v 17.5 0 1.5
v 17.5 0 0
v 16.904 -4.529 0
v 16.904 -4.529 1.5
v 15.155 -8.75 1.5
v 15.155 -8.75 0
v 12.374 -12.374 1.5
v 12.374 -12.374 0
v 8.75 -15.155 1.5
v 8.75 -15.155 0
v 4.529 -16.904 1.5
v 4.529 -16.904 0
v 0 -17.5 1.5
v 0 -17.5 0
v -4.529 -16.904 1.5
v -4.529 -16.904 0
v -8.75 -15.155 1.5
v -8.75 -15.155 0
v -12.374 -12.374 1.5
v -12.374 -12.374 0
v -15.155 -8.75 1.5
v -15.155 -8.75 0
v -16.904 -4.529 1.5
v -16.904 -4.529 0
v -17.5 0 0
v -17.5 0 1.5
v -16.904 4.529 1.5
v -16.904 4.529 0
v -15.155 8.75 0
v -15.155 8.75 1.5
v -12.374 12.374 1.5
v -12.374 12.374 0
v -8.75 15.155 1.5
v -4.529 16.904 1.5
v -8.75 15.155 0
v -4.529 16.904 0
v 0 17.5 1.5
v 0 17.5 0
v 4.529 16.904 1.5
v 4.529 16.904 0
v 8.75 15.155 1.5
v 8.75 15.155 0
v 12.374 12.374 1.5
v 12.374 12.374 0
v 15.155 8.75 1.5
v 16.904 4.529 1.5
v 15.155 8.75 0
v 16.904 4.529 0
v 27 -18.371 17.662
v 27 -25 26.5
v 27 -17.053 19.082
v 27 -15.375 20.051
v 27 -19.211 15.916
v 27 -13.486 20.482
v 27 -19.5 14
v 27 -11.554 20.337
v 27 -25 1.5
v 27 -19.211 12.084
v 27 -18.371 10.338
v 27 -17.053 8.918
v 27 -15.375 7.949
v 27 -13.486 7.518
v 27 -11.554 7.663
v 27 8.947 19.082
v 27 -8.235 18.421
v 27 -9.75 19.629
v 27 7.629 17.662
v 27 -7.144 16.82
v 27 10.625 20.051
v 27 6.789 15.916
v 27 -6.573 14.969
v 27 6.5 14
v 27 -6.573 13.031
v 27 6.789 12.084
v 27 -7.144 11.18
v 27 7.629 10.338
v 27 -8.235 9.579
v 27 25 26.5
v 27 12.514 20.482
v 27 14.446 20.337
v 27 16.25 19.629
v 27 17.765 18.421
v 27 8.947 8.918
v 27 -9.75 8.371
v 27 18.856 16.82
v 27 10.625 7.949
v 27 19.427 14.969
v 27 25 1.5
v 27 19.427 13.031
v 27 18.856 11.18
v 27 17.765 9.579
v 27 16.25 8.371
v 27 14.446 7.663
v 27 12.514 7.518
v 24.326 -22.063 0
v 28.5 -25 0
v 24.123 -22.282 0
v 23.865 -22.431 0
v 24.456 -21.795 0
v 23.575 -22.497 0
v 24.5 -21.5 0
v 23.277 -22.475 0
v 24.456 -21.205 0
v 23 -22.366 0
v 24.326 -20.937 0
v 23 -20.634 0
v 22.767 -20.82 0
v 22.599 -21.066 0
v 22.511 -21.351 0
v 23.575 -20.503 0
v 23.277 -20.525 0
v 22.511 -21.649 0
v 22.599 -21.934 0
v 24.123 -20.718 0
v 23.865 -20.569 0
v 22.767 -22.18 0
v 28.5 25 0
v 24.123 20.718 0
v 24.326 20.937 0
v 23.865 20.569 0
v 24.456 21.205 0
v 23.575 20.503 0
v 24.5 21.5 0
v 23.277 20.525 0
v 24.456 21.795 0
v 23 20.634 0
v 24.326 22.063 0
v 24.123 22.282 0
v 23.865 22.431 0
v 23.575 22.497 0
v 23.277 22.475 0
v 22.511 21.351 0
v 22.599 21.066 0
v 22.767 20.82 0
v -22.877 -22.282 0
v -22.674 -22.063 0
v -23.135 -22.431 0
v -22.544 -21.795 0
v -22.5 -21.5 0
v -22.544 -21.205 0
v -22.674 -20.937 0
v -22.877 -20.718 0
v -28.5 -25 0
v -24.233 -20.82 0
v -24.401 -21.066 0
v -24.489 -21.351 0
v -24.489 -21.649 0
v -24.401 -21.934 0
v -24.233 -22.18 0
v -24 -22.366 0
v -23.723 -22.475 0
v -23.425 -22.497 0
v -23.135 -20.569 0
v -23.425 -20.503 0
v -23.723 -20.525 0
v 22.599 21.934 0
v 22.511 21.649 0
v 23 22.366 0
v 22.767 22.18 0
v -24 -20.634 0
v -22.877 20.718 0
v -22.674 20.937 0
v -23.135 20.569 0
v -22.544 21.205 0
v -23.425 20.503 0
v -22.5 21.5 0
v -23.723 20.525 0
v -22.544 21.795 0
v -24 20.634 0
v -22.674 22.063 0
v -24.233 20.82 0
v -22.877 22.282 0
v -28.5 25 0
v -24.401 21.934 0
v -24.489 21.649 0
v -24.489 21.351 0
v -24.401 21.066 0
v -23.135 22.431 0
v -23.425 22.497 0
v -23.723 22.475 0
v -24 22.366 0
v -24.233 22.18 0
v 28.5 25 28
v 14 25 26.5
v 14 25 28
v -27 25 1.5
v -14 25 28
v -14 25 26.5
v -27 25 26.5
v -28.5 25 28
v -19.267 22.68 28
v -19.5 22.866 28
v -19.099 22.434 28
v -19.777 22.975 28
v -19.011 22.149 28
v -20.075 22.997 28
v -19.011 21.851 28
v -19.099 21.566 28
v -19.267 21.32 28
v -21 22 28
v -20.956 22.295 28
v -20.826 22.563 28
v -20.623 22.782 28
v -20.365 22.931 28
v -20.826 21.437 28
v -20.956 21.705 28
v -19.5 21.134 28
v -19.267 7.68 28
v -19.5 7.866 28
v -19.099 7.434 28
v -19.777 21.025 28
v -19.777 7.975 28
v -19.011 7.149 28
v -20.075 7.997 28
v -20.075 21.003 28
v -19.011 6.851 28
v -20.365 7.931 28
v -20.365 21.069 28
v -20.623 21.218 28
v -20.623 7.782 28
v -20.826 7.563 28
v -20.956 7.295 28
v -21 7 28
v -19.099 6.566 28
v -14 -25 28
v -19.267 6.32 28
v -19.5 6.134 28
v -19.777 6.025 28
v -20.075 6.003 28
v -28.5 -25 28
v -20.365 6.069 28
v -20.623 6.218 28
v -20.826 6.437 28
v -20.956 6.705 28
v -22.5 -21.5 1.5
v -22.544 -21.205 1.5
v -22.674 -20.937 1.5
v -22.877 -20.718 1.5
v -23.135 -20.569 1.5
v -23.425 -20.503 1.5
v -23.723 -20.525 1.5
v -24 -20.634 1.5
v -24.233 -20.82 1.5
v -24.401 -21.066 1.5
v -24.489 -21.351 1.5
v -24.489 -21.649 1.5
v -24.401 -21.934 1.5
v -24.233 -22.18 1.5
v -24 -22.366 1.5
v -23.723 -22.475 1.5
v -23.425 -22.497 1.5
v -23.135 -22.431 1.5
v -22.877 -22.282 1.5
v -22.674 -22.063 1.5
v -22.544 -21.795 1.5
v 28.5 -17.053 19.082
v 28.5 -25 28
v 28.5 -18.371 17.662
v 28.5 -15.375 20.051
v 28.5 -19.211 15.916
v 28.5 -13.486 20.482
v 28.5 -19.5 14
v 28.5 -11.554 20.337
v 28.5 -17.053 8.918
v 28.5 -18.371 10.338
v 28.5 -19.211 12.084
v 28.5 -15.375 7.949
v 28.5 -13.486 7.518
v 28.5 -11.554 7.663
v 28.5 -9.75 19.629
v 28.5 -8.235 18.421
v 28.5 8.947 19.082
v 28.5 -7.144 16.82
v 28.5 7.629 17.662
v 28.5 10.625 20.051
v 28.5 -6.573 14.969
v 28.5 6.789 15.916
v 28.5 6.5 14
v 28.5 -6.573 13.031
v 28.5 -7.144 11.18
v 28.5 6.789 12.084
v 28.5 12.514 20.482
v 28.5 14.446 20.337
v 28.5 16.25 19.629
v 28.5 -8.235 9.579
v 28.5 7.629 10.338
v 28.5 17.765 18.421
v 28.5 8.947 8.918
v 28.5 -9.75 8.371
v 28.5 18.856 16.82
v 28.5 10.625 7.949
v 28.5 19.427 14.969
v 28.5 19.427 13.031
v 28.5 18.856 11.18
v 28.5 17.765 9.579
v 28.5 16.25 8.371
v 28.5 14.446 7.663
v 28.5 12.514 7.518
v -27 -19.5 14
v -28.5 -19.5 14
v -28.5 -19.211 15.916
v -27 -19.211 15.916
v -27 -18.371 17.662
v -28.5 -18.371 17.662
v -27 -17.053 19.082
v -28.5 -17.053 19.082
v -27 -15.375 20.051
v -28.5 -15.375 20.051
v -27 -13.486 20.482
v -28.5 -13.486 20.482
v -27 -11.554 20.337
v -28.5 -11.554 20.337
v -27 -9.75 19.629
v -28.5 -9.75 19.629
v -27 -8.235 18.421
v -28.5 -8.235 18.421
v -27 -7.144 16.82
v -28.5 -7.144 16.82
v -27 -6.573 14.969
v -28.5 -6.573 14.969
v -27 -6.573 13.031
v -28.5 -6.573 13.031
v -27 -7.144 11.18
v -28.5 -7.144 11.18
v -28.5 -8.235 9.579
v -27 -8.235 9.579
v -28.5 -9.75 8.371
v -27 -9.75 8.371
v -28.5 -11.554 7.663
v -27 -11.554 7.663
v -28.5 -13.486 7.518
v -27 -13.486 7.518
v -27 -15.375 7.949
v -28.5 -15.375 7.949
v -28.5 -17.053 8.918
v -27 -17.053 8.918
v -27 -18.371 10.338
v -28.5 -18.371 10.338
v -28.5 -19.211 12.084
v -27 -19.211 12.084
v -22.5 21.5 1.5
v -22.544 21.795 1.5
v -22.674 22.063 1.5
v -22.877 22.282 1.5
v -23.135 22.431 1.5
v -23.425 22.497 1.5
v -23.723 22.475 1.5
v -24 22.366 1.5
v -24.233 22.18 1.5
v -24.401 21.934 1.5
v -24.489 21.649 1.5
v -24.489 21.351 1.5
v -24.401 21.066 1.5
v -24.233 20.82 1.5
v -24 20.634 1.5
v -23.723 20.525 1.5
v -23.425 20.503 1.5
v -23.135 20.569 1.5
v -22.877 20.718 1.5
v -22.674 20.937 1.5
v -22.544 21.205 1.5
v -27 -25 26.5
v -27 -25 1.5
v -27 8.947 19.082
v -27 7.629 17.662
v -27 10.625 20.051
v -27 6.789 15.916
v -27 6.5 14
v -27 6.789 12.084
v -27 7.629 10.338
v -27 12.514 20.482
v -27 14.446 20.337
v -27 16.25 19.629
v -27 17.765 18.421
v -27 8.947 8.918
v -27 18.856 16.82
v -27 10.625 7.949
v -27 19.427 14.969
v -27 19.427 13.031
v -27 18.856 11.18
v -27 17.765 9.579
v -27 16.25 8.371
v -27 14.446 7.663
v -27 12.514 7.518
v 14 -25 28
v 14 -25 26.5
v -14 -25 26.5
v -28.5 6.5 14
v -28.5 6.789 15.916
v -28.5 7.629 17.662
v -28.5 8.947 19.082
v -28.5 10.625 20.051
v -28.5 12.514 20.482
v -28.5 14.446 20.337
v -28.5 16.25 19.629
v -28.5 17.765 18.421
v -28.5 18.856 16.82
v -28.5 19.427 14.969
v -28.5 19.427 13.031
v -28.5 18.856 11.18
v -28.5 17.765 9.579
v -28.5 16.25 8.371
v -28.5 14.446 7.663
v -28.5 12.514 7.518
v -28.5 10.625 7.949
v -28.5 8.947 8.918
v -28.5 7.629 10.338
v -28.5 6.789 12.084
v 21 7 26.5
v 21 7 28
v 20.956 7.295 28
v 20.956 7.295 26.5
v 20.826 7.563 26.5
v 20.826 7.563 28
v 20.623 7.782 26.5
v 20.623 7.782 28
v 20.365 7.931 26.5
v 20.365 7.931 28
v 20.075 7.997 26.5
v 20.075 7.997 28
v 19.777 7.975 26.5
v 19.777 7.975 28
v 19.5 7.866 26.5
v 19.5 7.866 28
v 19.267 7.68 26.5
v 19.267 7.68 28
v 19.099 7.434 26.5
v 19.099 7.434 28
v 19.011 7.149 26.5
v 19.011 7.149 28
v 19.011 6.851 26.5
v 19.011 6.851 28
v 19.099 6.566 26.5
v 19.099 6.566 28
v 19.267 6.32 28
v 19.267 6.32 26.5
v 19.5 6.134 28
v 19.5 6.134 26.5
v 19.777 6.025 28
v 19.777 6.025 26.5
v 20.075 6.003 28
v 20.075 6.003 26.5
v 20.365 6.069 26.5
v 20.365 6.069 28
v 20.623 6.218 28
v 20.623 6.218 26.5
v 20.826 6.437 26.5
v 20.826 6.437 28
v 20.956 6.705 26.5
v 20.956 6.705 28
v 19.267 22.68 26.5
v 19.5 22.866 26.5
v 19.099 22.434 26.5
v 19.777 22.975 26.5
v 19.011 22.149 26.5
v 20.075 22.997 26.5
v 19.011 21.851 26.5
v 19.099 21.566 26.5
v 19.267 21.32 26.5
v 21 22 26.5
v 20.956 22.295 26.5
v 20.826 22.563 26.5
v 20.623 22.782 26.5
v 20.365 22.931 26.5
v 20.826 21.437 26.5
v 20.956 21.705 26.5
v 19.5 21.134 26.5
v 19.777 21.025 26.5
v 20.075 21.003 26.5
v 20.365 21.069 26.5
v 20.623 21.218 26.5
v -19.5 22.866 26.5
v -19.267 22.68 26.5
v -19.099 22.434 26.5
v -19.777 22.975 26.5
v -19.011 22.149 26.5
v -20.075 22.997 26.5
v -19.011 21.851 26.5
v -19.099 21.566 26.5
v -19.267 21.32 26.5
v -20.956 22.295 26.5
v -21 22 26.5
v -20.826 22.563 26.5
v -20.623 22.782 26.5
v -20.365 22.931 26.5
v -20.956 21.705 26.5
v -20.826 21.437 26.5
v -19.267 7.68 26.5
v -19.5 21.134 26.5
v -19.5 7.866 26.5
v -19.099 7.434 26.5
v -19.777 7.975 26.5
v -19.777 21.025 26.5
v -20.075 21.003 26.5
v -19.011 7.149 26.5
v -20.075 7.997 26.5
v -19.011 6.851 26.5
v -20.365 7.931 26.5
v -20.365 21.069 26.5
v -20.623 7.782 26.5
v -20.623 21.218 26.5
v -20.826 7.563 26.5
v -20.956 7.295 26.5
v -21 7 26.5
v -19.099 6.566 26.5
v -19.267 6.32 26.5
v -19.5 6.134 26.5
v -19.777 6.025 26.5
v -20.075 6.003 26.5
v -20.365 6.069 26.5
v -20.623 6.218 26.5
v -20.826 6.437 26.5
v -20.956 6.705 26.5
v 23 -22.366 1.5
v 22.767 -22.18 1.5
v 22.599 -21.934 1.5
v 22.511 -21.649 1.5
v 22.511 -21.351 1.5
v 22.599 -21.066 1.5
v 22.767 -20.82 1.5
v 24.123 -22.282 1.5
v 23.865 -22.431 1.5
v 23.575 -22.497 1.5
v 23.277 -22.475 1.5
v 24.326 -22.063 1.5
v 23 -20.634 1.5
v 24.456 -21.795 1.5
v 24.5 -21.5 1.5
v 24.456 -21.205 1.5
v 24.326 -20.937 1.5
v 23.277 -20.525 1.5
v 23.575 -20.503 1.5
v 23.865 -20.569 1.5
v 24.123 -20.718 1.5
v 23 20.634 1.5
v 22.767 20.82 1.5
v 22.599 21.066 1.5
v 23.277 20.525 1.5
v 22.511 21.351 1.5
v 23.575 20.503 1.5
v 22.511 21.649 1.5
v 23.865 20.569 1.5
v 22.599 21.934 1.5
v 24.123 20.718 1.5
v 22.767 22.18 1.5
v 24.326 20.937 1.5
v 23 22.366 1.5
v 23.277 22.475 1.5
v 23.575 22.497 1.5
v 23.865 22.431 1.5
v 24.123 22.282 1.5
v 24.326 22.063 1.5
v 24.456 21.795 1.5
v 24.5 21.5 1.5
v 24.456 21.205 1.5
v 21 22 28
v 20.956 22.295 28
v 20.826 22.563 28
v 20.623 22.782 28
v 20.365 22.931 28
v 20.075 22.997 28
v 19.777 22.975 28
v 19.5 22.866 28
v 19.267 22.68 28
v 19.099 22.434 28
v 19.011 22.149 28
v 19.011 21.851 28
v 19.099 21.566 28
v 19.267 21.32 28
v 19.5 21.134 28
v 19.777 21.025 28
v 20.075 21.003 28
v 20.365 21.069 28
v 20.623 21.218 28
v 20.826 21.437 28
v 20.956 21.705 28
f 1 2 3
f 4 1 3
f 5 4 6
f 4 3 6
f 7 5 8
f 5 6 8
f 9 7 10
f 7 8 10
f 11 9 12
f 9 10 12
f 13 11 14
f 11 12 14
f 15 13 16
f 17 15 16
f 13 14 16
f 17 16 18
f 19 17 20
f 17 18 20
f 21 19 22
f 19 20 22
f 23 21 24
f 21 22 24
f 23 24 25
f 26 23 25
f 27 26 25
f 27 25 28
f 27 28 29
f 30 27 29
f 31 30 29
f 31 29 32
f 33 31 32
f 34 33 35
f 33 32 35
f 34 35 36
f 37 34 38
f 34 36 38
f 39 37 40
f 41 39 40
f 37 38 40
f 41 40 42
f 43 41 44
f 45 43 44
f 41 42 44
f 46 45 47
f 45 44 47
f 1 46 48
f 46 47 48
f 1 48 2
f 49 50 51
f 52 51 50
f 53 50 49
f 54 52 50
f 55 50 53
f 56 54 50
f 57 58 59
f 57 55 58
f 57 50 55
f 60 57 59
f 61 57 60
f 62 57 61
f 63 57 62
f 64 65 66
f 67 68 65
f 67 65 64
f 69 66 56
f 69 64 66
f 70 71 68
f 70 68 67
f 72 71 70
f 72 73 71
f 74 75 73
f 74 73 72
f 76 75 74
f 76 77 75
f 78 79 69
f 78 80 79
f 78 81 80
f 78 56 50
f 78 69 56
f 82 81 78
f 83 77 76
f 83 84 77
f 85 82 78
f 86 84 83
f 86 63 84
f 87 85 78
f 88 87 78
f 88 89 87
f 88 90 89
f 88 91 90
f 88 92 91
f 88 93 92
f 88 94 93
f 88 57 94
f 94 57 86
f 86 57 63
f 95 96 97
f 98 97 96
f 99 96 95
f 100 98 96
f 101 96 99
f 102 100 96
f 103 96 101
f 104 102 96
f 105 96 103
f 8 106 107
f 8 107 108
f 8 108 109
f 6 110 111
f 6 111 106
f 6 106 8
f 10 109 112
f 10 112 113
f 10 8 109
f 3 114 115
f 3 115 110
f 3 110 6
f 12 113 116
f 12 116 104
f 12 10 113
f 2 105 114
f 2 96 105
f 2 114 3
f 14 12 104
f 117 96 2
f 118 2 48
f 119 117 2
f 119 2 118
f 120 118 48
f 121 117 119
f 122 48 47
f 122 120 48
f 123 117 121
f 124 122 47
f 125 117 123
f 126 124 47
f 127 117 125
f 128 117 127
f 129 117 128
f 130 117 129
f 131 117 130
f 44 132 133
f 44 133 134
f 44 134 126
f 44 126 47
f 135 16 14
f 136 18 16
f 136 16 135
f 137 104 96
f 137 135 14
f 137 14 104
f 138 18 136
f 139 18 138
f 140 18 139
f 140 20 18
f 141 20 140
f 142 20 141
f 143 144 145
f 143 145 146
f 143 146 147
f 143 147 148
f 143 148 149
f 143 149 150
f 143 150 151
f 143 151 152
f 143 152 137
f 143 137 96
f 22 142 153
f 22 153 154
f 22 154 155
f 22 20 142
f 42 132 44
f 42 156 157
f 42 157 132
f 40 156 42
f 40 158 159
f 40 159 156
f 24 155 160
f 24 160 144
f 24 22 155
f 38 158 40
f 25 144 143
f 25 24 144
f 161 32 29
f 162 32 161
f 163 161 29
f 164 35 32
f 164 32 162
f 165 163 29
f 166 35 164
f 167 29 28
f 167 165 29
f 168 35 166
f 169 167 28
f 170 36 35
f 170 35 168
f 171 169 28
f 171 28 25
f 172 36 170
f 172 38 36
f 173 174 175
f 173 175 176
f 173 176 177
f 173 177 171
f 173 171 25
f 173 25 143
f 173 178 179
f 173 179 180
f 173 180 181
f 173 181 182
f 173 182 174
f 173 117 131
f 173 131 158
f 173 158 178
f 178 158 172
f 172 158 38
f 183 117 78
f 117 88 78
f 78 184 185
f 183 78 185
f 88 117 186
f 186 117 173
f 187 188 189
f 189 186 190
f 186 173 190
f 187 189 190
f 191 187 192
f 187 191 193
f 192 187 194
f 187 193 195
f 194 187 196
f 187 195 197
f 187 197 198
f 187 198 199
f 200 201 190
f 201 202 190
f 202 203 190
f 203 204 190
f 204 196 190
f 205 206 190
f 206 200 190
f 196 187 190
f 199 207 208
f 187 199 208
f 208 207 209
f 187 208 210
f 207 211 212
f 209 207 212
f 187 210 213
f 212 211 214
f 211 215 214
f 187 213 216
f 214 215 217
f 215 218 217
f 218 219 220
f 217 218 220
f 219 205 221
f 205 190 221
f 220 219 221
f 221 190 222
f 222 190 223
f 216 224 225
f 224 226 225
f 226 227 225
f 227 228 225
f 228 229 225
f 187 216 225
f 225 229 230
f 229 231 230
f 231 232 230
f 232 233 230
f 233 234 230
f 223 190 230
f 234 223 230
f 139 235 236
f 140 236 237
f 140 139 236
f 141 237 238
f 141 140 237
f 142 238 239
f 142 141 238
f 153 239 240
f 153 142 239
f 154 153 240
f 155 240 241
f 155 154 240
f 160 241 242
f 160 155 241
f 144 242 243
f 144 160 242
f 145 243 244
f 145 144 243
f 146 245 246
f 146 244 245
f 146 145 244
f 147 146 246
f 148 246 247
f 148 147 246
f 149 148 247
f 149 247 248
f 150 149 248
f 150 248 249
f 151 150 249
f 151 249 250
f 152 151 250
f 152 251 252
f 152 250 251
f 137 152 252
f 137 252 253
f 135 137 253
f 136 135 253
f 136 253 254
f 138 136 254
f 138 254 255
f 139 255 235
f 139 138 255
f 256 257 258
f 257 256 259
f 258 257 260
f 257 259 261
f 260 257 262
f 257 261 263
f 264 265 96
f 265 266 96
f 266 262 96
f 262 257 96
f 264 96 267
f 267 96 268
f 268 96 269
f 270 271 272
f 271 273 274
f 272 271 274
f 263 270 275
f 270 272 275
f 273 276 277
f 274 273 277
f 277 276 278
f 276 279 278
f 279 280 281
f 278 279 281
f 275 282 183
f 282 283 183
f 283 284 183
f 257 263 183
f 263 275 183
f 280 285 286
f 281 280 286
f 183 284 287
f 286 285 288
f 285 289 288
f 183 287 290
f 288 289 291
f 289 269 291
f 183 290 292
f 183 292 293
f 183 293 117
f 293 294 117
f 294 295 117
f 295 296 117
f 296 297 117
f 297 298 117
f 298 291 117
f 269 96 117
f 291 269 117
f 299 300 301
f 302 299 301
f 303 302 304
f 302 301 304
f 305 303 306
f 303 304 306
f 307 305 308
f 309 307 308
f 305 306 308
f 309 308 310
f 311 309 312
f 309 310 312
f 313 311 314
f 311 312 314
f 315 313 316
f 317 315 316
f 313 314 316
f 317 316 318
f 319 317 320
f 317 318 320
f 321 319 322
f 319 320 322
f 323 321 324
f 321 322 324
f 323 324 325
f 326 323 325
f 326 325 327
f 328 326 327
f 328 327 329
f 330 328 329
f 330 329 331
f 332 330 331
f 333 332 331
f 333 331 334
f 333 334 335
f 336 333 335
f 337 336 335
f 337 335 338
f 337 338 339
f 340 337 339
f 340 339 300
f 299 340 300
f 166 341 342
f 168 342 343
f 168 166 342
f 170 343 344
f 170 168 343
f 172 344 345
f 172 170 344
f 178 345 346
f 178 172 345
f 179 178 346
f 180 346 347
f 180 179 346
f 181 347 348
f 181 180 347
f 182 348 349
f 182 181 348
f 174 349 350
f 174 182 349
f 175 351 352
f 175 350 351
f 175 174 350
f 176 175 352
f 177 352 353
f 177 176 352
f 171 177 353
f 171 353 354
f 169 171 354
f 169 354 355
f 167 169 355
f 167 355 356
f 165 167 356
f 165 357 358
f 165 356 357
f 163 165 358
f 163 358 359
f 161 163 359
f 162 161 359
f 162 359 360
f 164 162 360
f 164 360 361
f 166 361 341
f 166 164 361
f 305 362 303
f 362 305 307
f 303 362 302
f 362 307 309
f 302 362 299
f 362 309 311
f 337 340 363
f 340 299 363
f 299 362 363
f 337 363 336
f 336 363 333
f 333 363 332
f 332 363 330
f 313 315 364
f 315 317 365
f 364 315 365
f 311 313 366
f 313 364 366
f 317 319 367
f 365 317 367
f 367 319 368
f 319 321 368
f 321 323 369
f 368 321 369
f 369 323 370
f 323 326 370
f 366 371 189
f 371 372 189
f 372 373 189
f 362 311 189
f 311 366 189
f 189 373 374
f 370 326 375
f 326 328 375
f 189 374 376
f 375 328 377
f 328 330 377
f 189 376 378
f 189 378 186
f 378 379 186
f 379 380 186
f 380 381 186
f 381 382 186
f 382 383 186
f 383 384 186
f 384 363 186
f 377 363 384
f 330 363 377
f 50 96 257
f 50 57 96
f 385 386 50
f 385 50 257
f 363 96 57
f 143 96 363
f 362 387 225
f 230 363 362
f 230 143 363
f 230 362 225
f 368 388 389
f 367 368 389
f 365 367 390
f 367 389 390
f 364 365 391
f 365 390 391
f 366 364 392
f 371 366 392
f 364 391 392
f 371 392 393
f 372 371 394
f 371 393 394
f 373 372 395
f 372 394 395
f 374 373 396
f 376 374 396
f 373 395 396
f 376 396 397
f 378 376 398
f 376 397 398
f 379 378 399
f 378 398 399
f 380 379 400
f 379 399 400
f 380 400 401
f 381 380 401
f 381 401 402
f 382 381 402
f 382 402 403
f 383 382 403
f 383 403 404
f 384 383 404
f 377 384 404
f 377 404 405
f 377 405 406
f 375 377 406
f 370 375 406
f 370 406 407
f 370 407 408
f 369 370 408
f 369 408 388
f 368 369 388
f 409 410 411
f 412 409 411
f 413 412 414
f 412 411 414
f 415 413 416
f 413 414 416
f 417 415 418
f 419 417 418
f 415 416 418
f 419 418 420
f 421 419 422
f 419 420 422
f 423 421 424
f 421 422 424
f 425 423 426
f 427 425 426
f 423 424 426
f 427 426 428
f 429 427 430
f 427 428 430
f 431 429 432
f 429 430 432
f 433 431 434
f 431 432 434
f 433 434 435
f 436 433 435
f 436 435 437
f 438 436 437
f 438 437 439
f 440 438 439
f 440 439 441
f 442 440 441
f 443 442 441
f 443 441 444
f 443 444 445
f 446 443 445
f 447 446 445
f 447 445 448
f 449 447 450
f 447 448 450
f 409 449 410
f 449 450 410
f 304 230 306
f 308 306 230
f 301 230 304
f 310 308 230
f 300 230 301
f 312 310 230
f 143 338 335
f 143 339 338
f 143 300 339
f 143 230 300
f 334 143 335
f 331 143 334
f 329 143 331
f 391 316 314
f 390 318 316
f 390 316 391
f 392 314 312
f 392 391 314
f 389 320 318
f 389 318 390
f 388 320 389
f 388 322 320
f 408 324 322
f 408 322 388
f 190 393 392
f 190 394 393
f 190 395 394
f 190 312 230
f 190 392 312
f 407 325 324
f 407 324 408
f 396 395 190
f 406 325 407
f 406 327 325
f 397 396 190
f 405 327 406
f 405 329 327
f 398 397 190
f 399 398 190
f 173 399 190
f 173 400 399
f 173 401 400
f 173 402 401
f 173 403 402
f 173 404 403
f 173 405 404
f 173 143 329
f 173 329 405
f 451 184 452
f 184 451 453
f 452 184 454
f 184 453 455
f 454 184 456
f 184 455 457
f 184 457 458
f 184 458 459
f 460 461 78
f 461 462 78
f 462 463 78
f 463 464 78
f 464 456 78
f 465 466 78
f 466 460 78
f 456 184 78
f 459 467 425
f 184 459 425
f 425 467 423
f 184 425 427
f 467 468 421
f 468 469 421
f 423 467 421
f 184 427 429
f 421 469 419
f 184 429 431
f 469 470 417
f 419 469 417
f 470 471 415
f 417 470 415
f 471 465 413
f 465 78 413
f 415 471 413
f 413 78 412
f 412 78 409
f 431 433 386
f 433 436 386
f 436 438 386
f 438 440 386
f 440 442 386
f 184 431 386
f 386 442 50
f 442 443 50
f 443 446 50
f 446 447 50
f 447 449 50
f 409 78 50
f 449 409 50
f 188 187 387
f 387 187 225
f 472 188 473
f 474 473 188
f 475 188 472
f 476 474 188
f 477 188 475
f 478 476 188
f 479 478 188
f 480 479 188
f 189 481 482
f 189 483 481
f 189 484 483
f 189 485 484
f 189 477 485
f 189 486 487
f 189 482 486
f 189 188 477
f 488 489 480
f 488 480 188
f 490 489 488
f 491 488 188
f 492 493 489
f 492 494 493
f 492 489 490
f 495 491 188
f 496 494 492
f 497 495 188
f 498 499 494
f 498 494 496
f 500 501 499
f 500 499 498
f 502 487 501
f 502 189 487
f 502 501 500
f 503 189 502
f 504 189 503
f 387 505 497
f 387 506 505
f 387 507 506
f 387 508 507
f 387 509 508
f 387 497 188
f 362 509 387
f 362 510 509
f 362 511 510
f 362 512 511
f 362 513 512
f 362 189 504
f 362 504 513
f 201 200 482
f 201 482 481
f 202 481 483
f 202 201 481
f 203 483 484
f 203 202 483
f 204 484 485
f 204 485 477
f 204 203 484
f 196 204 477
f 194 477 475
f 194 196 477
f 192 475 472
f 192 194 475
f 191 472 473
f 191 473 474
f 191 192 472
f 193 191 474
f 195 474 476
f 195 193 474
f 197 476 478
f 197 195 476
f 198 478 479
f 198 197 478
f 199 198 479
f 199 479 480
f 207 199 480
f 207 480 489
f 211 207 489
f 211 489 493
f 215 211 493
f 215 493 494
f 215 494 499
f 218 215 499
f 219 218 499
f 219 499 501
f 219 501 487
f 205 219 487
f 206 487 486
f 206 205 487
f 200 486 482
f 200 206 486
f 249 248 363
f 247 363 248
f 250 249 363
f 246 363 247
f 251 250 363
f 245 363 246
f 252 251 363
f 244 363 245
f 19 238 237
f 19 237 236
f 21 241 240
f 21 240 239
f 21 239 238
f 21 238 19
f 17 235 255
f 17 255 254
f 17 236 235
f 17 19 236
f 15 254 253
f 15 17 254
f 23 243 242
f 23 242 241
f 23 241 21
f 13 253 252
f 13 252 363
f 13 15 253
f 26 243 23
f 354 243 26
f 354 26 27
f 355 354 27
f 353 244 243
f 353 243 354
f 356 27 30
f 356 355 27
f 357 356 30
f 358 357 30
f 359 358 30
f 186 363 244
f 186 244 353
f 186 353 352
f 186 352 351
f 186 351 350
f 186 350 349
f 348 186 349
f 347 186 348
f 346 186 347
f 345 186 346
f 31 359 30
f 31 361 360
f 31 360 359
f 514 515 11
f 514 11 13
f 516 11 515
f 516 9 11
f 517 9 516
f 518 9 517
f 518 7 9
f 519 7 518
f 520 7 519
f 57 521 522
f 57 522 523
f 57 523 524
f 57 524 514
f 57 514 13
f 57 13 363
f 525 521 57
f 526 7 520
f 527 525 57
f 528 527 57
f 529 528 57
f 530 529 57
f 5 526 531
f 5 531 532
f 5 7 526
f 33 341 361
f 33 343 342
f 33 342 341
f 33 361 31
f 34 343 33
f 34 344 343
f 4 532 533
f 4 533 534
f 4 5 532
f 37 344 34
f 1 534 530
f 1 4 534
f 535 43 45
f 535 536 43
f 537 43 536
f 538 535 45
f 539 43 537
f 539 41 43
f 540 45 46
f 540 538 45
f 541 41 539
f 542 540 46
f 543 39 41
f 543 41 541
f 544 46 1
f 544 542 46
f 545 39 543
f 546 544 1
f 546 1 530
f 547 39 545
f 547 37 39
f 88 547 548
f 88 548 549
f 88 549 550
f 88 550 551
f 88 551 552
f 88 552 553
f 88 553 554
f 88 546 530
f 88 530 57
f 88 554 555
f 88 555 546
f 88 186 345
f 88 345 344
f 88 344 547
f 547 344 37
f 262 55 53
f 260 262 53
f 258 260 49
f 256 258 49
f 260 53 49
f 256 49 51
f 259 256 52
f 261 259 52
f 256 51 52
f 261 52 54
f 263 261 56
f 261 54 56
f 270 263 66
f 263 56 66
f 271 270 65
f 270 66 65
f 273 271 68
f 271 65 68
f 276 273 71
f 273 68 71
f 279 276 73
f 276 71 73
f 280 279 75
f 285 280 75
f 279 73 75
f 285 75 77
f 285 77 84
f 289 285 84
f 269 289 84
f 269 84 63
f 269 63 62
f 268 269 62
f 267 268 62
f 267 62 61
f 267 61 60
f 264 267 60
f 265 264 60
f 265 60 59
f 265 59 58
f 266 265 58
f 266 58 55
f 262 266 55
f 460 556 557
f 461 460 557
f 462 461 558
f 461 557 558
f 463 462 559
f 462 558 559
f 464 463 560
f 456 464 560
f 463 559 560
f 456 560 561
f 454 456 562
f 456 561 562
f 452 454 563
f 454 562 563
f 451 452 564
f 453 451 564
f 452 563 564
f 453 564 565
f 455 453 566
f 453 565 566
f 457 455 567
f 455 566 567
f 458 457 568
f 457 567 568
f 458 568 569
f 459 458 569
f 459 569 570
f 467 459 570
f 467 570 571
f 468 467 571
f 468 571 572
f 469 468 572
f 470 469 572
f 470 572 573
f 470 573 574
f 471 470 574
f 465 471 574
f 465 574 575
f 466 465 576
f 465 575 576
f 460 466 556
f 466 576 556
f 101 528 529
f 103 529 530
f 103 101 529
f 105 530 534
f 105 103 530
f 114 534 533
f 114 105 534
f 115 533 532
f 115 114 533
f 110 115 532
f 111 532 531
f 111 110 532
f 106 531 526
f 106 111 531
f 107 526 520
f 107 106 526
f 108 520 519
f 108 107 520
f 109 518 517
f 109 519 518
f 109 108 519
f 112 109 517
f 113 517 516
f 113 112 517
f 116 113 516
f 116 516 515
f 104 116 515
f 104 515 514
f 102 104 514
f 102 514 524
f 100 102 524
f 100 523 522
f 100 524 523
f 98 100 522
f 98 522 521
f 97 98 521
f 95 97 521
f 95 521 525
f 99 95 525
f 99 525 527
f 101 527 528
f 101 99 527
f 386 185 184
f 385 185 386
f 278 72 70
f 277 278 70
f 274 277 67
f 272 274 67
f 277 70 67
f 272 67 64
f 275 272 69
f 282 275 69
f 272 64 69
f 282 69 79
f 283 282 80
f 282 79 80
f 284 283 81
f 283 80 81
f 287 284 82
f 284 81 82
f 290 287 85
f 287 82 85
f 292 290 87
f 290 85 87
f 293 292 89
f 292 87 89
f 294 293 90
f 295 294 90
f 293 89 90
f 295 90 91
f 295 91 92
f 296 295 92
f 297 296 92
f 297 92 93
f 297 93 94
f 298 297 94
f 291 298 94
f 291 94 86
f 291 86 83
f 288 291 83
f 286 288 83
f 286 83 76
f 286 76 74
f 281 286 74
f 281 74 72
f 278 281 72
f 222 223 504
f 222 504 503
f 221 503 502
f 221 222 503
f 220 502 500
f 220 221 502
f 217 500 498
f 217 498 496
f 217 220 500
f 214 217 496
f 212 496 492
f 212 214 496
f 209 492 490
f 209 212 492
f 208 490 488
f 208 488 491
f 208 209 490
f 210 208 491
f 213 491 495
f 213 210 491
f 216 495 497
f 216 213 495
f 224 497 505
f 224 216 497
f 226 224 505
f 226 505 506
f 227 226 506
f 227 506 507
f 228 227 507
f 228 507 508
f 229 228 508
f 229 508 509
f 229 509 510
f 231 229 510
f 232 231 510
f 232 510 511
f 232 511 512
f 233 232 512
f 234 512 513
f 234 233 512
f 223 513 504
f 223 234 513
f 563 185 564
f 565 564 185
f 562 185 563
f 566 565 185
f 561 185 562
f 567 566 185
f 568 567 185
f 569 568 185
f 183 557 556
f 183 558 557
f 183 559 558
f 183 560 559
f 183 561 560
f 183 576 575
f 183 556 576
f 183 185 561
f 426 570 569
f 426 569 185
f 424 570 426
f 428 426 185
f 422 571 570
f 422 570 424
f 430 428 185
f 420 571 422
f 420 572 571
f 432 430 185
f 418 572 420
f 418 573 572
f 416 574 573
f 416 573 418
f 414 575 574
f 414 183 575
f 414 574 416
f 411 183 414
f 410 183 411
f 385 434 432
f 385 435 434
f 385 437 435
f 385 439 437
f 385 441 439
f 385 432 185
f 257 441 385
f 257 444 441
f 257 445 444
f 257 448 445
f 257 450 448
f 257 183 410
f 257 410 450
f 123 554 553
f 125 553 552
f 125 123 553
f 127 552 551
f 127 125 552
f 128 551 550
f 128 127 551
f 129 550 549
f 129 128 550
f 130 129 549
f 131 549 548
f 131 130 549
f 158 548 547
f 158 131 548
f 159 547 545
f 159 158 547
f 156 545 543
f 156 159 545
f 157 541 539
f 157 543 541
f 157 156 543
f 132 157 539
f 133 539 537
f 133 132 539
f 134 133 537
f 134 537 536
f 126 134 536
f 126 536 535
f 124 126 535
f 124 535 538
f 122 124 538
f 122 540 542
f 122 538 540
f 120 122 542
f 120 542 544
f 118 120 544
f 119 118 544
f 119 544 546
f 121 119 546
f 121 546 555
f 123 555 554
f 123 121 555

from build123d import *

# Parameters (mm, degrees)
F0_W      = 54
F0_H      = 50
F0_R      = 1
F1_DEPTH  = 1.5
F2_W      = 1.5
F2_H      = 50
F3_DEPTH  = 28
F4_W      = 50
F4_H      = 1.5
F5_DEPTH  = 13
F6_R      = 1
F7_DEPTH  = 1.5
F9_R      = 6.5
F10_DEPTH = 57.001
F11_R     = 17.5
F12_DEPTH = 1.5


with BuildPart() as f1:
    # F0 (on Top) → F1 (new body)
    with BuildSketch(Plane.XY):
        Rectangle(F0_W, F0_H)
        with Locations((-23.5, -21.5)):
            Circle(F0_R, mode=Mode.SUBTRACT)
        with Locations((23.5, -21.5)):
            Circle(F0_R, mode=Mode.SUBTRACT)
        with Locations((-23.5, 21.5)):
            Circle(F0_R, mode=Mode.SUBTRACT)
        with Locations((23.5, 21.5)):
            Circle(F0_R, mode=Mode.SUBTRACT)
    extrude(amount=F1_DEPTH)

    # F2 (on Top) → F3 (join)
    with BuildSketch(Plane.XY):
        with Locations((27.75, 0)):
            Rectangle(F2_W, F2_H)
    extrude(amount=F3_DEPTH)

    # F4 (on face) → F5 (join)
    with BuildSketch(Plane(origin=(27, 0, 0), x_dir=(0, -1, 0), z_dir=(-1, 0, 0))):
        with Locations((0, 27.25)):
            Rectangle(F4_W, F4_H)
    extrude(amount=F5_DEPTH)

    # F6 (on face) → F7 (cut, through all)
    with BuildSketch(Plane.XY.offset(28)):
        with Locations((20, 22)):
            Circle(F6_R)
        with Locations((20, 7)):
            Circle(F6_R)
    extrude(amount=-F7_DEPTH, mode=Mode.SUBTRACT)

    # F8: F1 across plane


with BuildPart() as f1_1:
    add(f1.part)
    add(f1.part.mirror(Plane.YZ))

    # F9 (on face) → F10 (cut, through all)
    with BuildSketch(Plane(origin=(-28.5, 0, 0), x_dir=(0, -1, 0), z_dir=(-1, 0, 0))):
        with Locations((-13, 14)):
            Circle(F9_R)
        with Locations((13, 14)):
            Circle(F9_R)
    extrude(amount=-F10_DEPTH, mode=Mode.SUBTRACT)

    # F11 (on face) → F12 (cut, through all)
    with BuildSketch(Plane(origin=(0, 0, 0), x_dir=(1, 0, 0), z_dir=(0, 0, -1))):
        Circle(F11_R)
    extrude(amount=-F12_DEPTH, mode=Mode.SUBTRACT)


solid = f1_1.part
